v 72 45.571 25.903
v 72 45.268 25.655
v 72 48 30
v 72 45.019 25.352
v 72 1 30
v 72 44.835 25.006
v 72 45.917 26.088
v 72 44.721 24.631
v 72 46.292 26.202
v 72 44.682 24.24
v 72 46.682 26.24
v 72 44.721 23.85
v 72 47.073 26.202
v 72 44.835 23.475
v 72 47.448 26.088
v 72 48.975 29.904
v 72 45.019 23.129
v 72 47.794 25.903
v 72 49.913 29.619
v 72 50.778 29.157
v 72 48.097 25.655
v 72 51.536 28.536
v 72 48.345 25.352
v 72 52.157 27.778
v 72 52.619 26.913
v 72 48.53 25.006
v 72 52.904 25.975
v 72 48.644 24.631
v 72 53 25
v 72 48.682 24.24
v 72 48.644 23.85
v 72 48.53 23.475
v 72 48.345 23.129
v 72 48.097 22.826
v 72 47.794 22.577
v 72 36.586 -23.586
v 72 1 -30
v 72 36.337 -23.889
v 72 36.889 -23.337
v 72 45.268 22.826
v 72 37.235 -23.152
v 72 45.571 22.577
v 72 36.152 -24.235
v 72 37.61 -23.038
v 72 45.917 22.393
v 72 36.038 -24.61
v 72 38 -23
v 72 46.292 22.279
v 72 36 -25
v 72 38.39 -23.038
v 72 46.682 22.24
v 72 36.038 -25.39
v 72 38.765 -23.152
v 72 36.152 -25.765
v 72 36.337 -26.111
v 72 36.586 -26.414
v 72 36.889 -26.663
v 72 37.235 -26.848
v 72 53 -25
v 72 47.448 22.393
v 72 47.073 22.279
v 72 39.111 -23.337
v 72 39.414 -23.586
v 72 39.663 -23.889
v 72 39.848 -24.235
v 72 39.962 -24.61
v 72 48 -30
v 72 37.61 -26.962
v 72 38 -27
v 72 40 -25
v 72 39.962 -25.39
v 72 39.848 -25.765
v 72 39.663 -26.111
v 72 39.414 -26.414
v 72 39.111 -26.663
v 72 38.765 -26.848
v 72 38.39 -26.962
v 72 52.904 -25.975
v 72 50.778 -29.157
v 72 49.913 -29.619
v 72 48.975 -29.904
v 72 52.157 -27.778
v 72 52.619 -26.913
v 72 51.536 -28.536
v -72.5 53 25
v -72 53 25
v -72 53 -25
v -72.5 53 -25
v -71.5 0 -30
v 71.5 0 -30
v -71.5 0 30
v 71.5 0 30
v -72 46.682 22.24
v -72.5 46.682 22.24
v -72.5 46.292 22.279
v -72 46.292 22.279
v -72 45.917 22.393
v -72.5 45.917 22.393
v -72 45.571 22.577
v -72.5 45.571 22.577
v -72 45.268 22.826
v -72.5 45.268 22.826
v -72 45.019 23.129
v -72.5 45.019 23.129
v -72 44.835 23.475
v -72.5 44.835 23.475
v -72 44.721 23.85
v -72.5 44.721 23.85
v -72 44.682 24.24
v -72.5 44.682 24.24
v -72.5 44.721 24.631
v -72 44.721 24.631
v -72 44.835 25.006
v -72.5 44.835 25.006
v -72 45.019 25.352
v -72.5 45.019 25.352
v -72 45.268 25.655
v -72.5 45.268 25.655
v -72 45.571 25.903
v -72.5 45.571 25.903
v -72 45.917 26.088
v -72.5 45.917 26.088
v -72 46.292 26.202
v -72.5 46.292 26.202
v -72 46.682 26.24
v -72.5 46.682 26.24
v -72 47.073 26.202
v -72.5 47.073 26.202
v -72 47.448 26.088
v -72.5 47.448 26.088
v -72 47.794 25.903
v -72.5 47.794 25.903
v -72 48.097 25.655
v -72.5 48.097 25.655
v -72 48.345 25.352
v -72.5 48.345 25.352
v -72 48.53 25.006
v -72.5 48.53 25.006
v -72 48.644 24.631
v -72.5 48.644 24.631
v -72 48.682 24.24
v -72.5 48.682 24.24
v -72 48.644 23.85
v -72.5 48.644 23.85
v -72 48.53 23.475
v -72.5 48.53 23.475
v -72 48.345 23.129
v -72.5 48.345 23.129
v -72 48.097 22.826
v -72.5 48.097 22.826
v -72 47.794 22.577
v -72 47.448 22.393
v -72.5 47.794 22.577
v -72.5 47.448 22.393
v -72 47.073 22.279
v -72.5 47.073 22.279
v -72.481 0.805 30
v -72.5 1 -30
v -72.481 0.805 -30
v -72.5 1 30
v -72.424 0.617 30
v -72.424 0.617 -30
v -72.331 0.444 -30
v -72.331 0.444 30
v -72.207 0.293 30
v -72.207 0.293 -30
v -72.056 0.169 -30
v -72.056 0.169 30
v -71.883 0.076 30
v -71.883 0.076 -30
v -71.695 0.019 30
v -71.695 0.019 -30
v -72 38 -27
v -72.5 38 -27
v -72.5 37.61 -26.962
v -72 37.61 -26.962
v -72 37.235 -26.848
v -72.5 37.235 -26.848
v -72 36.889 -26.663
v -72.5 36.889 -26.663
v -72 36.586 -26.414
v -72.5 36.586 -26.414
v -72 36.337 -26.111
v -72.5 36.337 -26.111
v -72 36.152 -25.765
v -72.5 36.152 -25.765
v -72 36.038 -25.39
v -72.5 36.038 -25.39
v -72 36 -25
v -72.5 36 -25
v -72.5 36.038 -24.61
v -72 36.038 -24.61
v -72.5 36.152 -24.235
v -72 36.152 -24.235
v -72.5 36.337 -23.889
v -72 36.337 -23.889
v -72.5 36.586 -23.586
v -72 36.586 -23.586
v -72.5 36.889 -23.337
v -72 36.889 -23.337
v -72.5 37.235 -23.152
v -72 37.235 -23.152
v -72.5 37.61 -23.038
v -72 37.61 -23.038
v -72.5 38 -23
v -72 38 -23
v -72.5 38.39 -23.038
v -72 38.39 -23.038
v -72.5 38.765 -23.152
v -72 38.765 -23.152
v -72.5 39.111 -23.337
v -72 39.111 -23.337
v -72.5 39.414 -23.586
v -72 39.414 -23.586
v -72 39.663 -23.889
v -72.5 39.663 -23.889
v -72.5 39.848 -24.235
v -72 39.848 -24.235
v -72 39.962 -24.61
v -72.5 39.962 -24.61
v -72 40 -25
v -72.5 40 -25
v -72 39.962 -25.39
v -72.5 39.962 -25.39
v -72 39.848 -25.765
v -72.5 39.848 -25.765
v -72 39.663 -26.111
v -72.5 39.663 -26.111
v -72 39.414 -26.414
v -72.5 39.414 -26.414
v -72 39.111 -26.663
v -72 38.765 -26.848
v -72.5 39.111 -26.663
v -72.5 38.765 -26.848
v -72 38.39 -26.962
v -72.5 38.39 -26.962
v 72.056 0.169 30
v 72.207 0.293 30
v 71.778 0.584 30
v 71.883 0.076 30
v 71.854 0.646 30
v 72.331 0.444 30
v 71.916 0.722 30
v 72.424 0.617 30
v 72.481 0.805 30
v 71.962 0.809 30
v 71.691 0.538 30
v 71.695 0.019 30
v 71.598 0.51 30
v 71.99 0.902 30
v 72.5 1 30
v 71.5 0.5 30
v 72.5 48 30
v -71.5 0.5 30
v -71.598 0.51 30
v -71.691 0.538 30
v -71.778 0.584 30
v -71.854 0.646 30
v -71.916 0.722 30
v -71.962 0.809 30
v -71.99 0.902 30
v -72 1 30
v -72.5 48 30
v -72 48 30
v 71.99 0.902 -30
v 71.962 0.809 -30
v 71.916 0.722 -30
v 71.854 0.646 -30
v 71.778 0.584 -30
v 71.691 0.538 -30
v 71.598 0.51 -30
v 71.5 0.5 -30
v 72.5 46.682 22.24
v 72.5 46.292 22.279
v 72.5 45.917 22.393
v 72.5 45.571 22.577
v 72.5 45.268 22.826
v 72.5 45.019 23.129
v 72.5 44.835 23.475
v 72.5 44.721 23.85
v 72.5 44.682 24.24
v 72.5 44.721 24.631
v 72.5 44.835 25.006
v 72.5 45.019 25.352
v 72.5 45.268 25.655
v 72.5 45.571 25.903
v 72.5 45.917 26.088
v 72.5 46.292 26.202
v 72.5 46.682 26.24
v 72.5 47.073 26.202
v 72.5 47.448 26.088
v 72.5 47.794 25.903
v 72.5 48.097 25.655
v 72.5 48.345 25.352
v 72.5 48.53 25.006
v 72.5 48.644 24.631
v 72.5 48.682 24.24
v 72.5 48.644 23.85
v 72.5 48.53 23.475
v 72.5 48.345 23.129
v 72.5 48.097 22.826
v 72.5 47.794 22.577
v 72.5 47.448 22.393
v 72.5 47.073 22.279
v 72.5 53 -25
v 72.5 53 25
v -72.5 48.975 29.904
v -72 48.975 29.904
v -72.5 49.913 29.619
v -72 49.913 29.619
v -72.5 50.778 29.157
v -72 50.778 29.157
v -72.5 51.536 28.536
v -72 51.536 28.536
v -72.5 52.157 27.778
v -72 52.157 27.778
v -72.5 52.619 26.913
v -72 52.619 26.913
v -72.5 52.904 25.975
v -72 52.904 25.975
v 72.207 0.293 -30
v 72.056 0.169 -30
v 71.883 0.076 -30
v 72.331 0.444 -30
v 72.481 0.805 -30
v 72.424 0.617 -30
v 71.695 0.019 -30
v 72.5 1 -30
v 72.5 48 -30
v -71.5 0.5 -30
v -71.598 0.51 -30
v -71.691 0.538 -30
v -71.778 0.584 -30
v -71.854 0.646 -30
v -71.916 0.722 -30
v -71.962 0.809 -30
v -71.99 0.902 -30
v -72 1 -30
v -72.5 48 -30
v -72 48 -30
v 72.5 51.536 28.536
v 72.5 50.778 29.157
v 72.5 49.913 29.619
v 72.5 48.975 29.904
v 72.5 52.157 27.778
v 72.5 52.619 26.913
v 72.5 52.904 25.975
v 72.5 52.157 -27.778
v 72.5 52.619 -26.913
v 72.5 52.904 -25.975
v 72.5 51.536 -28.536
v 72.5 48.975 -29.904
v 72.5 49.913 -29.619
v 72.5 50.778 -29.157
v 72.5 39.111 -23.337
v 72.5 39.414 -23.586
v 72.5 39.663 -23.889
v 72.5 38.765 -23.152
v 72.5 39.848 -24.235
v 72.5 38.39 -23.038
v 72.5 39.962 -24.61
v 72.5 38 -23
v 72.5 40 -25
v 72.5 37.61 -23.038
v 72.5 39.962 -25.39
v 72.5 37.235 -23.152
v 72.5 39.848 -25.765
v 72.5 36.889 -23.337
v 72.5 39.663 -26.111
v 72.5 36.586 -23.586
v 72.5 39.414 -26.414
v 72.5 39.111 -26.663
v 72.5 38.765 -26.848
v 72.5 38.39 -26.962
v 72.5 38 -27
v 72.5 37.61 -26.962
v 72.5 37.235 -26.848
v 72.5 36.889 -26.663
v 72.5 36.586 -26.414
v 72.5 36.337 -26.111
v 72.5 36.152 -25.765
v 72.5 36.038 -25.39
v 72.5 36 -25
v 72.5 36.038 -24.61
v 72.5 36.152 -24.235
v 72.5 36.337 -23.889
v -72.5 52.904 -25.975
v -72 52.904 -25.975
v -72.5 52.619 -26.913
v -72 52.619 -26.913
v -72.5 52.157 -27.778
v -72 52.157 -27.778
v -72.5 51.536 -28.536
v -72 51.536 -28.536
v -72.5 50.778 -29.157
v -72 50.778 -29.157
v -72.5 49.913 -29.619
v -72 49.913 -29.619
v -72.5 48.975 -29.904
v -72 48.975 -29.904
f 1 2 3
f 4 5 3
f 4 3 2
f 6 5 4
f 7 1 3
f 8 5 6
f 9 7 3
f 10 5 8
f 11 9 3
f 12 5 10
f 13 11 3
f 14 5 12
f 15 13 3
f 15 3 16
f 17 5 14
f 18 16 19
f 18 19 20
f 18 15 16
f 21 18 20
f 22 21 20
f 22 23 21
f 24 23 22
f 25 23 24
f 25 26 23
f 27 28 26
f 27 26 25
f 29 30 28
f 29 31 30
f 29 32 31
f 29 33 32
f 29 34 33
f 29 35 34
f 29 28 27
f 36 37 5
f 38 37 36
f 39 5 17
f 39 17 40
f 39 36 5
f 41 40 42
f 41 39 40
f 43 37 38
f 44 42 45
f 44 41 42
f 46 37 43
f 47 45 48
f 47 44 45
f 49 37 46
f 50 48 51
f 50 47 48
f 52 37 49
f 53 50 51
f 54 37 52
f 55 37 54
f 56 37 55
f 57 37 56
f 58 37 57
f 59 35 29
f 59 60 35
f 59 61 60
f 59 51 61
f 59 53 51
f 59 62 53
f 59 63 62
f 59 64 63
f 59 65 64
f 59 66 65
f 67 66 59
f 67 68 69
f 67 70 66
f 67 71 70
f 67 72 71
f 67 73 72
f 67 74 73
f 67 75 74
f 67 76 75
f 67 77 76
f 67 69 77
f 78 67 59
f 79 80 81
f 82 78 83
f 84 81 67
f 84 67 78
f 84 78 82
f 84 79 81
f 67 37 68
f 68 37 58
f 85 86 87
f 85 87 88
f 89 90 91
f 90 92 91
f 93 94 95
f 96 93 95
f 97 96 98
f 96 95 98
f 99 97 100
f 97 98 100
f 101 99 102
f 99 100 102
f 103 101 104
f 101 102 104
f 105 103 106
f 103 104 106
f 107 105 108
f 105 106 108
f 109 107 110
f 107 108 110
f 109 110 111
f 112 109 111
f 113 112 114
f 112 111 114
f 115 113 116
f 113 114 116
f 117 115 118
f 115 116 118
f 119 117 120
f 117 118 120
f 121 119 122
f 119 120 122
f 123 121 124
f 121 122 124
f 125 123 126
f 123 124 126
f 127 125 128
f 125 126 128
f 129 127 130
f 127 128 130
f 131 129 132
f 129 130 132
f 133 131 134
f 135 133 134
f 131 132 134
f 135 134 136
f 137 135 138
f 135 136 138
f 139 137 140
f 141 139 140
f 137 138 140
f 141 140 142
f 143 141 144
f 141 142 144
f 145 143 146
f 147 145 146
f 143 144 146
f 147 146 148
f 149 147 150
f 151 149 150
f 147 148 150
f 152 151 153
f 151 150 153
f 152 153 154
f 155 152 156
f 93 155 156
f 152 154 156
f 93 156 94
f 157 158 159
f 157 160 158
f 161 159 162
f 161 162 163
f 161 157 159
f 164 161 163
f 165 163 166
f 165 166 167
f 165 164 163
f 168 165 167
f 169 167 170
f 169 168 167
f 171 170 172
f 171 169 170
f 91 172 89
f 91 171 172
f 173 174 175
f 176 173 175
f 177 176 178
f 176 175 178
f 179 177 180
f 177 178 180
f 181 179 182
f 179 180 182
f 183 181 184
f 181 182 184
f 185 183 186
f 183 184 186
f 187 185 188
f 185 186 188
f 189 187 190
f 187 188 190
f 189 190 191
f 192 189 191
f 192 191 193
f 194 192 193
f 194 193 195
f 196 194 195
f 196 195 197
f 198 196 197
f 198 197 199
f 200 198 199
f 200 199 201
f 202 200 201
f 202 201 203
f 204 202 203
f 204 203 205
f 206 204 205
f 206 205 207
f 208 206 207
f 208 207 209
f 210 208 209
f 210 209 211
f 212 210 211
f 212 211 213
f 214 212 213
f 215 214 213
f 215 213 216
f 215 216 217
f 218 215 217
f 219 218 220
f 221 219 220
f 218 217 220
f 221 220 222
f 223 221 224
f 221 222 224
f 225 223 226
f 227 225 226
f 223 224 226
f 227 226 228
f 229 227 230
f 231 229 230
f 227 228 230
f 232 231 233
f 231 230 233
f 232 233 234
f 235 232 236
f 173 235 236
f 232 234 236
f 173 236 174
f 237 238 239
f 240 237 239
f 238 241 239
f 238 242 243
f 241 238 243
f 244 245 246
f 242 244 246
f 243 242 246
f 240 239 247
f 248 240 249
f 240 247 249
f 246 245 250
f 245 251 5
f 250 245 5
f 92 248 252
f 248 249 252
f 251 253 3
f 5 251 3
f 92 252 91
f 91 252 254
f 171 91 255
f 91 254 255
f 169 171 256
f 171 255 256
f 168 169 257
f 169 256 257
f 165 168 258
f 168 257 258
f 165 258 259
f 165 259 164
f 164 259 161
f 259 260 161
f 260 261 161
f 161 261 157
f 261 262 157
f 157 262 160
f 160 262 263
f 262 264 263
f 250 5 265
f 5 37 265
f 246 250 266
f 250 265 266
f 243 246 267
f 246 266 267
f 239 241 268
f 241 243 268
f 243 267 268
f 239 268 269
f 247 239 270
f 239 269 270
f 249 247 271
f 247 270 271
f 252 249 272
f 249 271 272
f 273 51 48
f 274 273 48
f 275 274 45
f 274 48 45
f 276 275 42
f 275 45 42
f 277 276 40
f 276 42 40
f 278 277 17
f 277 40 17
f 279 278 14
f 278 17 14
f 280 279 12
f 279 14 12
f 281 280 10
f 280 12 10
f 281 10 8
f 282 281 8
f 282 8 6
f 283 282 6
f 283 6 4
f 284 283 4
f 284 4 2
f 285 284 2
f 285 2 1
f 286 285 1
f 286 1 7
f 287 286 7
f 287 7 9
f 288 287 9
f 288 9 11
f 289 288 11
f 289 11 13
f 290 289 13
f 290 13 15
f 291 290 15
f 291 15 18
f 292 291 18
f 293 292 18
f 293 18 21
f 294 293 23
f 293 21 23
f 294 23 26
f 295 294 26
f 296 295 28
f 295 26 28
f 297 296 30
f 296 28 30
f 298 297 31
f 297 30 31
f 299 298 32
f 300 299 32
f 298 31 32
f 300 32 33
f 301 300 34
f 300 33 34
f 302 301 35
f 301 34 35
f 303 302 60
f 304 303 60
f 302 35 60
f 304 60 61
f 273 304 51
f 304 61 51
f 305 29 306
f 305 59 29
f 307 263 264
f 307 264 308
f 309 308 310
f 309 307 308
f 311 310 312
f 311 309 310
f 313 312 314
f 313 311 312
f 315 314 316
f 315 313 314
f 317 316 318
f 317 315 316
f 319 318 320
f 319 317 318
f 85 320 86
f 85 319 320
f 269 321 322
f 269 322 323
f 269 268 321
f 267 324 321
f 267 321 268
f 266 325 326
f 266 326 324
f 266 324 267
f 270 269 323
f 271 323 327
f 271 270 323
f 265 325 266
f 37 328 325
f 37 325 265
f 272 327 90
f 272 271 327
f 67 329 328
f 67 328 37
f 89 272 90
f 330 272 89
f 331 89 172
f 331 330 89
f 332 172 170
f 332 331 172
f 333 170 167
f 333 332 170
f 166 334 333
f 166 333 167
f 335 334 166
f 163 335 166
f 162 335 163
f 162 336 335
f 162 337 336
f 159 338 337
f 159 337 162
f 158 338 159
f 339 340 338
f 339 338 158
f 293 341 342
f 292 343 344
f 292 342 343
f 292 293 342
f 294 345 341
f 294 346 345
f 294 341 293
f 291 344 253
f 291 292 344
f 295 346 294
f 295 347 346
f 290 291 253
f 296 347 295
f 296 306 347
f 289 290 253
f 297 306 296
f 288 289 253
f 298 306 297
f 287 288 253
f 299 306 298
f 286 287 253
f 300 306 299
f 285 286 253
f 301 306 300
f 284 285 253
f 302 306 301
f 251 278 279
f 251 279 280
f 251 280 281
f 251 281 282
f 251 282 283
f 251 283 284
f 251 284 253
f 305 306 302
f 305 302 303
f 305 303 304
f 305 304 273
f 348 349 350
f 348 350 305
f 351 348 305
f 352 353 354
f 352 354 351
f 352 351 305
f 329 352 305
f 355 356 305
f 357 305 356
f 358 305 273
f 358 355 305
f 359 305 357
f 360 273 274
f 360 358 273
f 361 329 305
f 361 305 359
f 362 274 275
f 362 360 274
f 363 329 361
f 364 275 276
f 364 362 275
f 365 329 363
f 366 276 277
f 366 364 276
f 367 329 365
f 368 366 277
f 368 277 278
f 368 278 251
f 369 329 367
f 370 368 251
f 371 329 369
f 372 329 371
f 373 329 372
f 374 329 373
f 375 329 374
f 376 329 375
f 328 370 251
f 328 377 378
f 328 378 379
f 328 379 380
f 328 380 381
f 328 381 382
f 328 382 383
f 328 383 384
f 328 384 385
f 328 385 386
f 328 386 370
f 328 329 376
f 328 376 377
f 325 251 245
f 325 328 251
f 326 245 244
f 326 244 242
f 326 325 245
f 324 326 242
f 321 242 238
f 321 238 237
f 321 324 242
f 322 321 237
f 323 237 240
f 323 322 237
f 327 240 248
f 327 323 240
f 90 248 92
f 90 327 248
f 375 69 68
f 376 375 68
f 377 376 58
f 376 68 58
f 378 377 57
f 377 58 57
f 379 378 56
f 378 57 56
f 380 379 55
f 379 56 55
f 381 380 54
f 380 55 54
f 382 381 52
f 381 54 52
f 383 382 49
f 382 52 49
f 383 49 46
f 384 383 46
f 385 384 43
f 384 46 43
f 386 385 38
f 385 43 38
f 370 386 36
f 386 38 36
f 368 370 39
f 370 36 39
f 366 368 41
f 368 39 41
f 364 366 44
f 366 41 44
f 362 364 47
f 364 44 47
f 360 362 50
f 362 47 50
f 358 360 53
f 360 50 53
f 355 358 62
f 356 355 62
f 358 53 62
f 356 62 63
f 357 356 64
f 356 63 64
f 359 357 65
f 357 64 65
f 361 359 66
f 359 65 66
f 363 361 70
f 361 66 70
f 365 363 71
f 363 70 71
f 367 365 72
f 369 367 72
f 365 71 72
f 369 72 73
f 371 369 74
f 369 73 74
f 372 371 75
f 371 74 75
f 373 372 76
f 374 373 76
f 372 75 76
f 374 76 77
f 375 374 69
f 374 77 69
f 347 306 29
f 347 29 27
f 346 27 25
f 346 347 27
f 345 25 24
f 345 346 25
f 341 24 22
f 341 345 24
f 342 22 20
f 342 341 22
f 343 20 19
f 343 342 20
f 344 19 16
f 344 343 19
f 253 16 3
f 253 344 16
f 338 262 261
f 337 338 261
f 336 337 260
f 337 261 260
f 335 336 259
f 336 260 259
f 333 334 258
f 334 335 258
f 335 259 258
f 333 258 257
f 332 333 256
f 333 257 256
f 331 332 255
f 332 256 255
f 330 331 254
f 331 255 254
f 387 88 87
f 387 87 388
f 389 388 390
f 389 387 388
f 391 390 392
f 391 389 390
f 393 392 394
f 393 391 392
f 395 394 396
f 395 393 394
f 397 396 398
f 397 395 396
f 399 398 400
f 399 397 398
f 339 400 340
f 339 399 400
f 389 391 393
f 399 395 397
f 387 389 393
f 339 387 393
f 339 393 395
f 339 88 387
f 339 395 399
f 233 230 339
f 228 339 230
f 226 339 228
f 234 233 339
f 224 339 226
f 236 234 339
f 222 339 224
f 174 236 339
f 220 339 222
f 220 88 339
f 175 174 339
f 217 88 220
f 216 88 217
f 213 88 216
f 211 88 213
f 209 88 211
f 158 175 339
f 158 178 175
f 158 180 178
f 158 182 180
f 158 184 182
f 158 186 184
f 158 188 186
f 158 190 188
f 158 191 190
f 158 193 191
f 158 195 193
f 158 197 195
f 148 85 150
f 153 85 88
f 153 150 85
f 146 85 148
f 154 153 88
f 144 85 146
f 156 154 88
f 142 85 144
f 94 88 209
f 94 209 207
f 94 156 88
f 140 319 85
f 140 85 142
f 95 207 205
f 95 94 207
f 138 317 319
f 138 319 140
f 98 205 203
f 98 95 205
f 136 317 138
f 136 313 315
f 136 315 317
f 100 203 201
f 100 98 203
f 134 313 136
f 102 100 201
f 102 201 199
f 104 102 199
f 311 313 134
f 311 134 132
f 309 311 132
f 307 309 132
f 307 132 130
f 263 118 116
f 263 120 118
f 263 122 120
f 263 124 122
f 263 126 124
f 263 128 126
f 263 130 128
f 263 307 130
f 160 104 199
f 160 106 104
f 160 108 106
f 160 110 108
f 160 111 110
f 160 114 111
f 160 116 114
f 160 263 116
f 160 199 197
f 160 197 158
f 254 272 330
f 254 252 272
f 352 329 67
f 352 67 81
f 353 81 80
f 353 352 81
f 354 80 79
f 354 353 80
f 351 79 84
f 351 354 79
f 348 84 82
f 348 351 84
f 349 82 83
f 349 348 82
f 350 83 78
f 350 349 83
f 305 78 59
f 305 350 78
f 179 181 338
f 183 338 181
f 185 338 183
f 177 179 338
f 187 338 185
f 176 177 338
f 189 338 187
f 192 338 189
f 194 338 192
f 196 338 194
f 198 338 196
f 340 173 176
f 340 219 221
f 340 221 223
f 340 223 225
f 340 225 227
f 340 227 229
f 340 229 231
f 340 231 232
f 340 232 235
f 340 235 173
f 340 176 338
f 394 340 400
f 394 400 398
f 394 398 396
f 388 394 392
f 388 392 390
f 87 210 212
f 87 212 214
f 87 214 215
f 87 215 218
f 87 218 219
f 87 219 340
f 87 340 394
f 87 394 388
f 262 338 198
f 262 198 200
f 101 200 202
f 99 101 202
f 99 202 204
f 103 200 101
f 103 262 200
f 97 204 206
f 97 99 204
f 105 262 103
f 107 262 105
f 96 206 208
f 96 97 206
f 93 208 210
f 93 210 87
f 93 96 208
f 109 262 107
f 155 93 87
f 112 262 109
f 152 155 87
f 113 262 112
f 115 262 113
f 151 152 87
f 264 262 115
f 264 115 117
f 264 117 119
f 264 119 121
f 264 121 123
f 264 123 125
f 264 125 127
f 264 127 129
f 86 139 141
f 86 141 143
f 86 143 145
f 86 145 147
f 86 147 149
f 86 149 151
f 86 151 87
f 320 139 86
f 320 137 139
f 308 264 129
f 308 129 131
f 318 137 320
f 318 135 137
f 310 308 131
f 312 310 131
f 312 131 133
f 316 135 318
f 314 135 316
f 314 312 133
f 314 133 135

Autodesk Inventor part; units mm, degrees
ref_plane "YZ Plane" through (0, 0, 0) normal (1, 0, 0) x (0, 1, 0)
ref_plane "XZ Plane" through (0, 0, 0) normal (0, 1, 0) x (-1, 0, 0)
ref_plane "XY Plane" through (0, 0, 0) normal (0, 0, 1) x (1, 0, 0)
sketch "Sketch1" plane through (0, 0, 0) normal (0, 1, 0) x (-1, 0, 0)
  line L0 (-72, 30) -> (72, 30)
  line L1 (72, 30) -> (72, -30)
  line L2 (72, -30) -> (-72, -30)
  line L3 (-72, -30) -> (-72, 30)
  point P0 (0, 0)
  dimension "d0" = 144
  dimension "d1" = 60
  dimension "d2" = 72
  dimension "d3" = 30
extrude "Plate1" add sketch "Sketch1" along normal blind 0.5
sketch "Sketch3" plane through (72, 0.5, -30) normal (1, 0, 0) x (0, 1, 0)
  line L0 (0, 60) -> (0, 0)
  line L1 (0, 0) -> (52.5, 0)
  line L2 (52.5, 0) -> (52.5, 60)
  line L3 (52.5, 60) -> (0, 60)
edge flange "Flange1" height 53 angle 90 thickness 0.5 bend radius 0.5 thickness toward (1, 0, 0) relief tear relief width 0.5 relief depth 0.25 corner gap 0.5 corner form 0 edges at (72, 0.5, 0) (-72, 0.5, 0) wall of the first edge with corners at (72, 0.5, 30) (72, 0.5, -30) (72, 53, -30) (72, 53, 30)
bend "Bend1"
corner "Corner1"
fillet "Corner Round1" radius 5 4 edges at (-72.25, 53, -30) (-72.25, 53, 30) (72.25, 53, -30) (72.25, 53, 30)
sketch "Sketch4" plane through (72.5, 1, 30) normal (1, 0, 0) x (0, 0, -1)
  line L0 (5, 52) -> (55, 52) projected
  line L1 (60, 47) -> (60, 0) projected
  line L2 (5.7596, 45.6824) -> (55, 37) construction
  point P0 (30, -1)
  dimension "d19" = 5
  dimension "d20" = 15
  dimension "d21" = 50
  dimension "d22" = 10
hole "Hole1" at (72.5, 38, -25) at (72.5, 46.6824, 24.2404) direction (-1, 0, 0) diameter 4 end through all
equation "\"d28\" = Thickness"
equation "\"d8\" = BendReliefWidth"
equation "\"d9\" = BendReliefDepth"
equation "\"d10\" = MinimumRemnant"
equation "\"d11\" = BendRadius"
equation "\"d14\" = BendRadius"
equation "\"d15\" = CornerReliefSize"
equation "\"d16\" = GapSize"
equation "\"d17\" = JacobiRadiusSize"
equation "\"d2\" = 0.5 * d0"
equation "\"d3\" = 0.5 * d1"
equation "\"BendRadius\" = Thickness"
equation "\"BendReliefWidth\" = Thickness"
equation "\"BendReliefDepth\" = 0.5 * Thickness"
equation "\"CornerReliefSize\" = 4 * Thickness"
equation "\"MinimumRemnant\" = 2 * Thickness"
equation "\"TransitionRadius\" = BendRadius"
equation "\"JacobiRadiusSize\" = BendRadius"
equation "\"GapSize\" = Thickness"
equation "\"d4\" = BendRadius"
equation "\"Thickness\" = 0.5"
properties part number "radio_base"
